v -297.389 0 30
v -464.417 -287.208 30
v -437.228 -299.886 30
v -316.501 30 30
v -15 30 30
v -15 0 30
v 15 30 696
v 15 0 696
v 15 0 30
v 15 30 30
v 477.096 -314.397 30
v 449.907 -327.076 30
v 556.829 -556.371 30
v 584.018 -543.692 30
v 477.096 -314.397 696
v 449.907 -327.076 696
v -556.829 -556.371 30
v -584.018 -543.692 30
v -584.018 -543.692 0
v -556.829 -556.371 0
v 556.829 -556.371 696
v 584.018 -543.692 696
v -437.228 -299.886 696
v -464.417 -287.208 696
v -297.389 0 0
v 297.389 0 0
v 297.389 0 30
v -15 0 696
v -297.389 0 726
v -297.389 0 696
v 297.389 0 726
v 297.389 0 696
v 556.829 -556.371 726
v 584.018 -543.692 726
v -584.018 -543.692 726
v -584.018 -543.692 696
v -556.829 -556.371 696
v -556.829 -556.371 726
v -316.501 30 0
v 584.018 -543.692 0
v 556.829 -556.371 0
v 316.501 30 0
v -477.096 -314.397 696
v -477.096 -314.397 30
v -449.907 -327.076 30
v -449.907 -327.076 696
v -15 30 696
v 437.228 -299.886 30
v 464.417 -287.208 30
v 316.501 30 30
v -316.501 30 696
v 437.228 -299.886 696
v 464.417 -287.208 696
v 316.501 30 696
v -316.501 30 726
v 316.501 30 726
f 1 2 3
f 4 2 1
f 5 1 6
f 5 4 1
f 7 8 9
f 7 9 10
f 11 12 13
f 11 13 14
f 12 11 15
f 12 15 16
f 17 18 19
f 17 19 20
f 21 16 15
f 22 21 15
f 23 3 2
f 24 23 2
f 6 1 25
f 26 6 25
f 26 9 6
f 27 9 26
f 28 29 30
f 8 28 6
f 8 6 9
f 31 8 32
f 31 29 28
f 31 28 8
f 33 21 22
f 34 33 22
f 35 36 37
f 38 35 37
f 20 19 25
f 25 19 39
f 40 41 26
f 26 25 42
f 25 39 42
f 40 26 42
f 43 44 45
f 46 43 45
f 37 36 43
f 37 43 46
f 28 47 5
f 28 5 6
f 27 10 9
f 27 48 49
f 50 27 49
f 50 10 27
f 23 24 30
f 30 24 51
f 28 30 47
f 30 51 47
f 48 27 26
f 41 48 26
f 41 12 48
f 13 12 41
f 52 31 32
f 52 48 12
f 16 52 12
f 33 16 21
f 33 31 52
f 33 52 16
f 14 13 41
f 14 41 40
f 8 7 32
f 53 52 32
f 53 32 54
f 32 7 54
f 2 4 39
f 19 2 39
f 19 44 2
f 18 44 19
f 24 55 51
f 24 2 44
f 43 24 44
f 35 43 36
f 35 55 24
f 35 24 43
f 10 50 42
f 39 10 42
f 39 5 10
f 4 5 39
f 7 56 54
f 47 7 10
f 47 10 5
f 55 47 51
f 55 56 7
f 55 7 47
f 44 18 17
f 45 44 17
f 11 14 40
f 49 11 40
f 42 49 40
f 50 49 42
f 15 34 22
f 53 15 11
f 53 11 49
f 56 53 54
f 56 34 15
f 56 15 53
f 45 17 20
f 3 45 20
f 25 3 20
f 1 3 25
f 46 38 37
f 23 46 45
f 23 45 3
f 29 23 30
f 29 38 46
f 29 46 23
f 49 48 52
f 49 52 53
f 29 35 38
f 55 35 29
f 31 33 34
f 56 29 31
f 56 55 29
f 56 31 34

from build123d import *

# Parameters (mm, degrees)
F1_DEPTH = 30
F3_DEPTH = 333
F5_DEPTH = 333


with BuildPart() as f1:
    # F0 (on Top) → F1 (new body)
    with BuildSketch(Plane.XY):
        Polygon((-297.3889, 0), (0, 0), (297.3889, 0), (556.8289580754, -556.371), (584.0181916865, -543.6924521478), (316.5010078242, 30), (0, 30), (-316.5010078242, 30), (-584.0181916865, -543.6924521478), (-556.8289580754, -556.371), align=None)
    extrude(amount=F1_DEPTH)

    # F2 (on face) → F3 (join)
    with BuildSketch(Plane.XY.offset(30)):
        Polygon((-15, 0), (0, 0), (15, 0), (15, 30), (-15, 30), align=None)
    extrude(amount=F3_DEPTH)

    # F4 (on face) → F5 (join)
    with BuildSketch(Plane.XY.offset(30)):
        Polygon((-437.2281658224, -299.886273315), (-464.4173994335, -287.2077254628), (-477.0959472857, -314.3969590739), (-449.9067136746, -327.0755069261), align=None)
    extrude(amount=F5_DEPTH)

    # F6: F1 across plane


with BuildPart() as f1_1:
    add(f1.part)
    add(f1.part.mirror(Plane.YZ))

    # F7: F1 across face


with BuildPart() as f1_2:
    add(f1_1.part)
    add(f1_1.part.mirror(Plane(origin=(0, 15, 363), x_dir=(1, 0, 0), z_dir=(0, 0, 1))))


solid = f1_2.part
